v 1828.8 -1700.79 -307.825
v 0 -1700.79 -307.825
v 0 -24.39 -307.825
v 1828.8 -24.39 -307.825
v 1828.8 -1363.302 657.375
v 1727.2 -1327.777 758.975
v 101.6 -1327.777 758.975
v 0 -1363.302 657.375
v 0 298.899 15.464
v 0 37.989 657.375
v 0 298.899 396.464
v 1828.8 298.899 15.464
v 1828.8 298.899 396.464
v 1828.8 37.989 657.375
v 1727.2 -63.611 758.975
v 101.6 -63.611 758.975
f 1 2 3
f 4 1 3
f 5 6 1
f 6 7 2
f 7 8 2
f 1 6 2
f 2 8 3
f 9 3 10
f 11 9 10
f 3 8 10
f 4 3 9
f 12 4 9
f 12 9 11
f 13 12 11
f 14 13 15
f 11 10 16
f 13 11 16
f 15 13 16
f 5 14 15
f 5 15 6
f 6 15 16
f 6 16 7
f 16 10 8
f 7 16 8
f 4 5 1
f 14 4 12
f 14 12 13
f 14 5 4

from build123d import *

# Parameters (mm, degrees)
F1_DEPTH = 1828.8
F3_SIZE  = 101.6
F4_SIZE  = 101.6


with BuildPart() as f1:
    # F0 (on Right) → F1 (new body)
    with BuildSketch(Plane.YZ):
        Polygon((-1327.777296, 758.974876), (-1700.789874, -307.825124), (-24.389874, -307.825124), (298.899346, 15.464096), (298.899346, 396.464096), (-63.611433, 758.974876), align=None)
    extrude(amount=F1_DEPTH)

    # F3
    f3_edges = [f1.edges().sort_by_distance(p)[0] for p in [
        (1828.8, -695.694365, 758.974876),
    ]]
    chamfer(f3_edges, length=F3_SIZE)

    # F4
    f4_edges = [f1.edges().sort_by_distance(p)[0] for p in [
        (0, -695.694365, 758.974876),
    ]]
    chamfer(f4_edges, length=F4_SIZE)


solid = f1.part
